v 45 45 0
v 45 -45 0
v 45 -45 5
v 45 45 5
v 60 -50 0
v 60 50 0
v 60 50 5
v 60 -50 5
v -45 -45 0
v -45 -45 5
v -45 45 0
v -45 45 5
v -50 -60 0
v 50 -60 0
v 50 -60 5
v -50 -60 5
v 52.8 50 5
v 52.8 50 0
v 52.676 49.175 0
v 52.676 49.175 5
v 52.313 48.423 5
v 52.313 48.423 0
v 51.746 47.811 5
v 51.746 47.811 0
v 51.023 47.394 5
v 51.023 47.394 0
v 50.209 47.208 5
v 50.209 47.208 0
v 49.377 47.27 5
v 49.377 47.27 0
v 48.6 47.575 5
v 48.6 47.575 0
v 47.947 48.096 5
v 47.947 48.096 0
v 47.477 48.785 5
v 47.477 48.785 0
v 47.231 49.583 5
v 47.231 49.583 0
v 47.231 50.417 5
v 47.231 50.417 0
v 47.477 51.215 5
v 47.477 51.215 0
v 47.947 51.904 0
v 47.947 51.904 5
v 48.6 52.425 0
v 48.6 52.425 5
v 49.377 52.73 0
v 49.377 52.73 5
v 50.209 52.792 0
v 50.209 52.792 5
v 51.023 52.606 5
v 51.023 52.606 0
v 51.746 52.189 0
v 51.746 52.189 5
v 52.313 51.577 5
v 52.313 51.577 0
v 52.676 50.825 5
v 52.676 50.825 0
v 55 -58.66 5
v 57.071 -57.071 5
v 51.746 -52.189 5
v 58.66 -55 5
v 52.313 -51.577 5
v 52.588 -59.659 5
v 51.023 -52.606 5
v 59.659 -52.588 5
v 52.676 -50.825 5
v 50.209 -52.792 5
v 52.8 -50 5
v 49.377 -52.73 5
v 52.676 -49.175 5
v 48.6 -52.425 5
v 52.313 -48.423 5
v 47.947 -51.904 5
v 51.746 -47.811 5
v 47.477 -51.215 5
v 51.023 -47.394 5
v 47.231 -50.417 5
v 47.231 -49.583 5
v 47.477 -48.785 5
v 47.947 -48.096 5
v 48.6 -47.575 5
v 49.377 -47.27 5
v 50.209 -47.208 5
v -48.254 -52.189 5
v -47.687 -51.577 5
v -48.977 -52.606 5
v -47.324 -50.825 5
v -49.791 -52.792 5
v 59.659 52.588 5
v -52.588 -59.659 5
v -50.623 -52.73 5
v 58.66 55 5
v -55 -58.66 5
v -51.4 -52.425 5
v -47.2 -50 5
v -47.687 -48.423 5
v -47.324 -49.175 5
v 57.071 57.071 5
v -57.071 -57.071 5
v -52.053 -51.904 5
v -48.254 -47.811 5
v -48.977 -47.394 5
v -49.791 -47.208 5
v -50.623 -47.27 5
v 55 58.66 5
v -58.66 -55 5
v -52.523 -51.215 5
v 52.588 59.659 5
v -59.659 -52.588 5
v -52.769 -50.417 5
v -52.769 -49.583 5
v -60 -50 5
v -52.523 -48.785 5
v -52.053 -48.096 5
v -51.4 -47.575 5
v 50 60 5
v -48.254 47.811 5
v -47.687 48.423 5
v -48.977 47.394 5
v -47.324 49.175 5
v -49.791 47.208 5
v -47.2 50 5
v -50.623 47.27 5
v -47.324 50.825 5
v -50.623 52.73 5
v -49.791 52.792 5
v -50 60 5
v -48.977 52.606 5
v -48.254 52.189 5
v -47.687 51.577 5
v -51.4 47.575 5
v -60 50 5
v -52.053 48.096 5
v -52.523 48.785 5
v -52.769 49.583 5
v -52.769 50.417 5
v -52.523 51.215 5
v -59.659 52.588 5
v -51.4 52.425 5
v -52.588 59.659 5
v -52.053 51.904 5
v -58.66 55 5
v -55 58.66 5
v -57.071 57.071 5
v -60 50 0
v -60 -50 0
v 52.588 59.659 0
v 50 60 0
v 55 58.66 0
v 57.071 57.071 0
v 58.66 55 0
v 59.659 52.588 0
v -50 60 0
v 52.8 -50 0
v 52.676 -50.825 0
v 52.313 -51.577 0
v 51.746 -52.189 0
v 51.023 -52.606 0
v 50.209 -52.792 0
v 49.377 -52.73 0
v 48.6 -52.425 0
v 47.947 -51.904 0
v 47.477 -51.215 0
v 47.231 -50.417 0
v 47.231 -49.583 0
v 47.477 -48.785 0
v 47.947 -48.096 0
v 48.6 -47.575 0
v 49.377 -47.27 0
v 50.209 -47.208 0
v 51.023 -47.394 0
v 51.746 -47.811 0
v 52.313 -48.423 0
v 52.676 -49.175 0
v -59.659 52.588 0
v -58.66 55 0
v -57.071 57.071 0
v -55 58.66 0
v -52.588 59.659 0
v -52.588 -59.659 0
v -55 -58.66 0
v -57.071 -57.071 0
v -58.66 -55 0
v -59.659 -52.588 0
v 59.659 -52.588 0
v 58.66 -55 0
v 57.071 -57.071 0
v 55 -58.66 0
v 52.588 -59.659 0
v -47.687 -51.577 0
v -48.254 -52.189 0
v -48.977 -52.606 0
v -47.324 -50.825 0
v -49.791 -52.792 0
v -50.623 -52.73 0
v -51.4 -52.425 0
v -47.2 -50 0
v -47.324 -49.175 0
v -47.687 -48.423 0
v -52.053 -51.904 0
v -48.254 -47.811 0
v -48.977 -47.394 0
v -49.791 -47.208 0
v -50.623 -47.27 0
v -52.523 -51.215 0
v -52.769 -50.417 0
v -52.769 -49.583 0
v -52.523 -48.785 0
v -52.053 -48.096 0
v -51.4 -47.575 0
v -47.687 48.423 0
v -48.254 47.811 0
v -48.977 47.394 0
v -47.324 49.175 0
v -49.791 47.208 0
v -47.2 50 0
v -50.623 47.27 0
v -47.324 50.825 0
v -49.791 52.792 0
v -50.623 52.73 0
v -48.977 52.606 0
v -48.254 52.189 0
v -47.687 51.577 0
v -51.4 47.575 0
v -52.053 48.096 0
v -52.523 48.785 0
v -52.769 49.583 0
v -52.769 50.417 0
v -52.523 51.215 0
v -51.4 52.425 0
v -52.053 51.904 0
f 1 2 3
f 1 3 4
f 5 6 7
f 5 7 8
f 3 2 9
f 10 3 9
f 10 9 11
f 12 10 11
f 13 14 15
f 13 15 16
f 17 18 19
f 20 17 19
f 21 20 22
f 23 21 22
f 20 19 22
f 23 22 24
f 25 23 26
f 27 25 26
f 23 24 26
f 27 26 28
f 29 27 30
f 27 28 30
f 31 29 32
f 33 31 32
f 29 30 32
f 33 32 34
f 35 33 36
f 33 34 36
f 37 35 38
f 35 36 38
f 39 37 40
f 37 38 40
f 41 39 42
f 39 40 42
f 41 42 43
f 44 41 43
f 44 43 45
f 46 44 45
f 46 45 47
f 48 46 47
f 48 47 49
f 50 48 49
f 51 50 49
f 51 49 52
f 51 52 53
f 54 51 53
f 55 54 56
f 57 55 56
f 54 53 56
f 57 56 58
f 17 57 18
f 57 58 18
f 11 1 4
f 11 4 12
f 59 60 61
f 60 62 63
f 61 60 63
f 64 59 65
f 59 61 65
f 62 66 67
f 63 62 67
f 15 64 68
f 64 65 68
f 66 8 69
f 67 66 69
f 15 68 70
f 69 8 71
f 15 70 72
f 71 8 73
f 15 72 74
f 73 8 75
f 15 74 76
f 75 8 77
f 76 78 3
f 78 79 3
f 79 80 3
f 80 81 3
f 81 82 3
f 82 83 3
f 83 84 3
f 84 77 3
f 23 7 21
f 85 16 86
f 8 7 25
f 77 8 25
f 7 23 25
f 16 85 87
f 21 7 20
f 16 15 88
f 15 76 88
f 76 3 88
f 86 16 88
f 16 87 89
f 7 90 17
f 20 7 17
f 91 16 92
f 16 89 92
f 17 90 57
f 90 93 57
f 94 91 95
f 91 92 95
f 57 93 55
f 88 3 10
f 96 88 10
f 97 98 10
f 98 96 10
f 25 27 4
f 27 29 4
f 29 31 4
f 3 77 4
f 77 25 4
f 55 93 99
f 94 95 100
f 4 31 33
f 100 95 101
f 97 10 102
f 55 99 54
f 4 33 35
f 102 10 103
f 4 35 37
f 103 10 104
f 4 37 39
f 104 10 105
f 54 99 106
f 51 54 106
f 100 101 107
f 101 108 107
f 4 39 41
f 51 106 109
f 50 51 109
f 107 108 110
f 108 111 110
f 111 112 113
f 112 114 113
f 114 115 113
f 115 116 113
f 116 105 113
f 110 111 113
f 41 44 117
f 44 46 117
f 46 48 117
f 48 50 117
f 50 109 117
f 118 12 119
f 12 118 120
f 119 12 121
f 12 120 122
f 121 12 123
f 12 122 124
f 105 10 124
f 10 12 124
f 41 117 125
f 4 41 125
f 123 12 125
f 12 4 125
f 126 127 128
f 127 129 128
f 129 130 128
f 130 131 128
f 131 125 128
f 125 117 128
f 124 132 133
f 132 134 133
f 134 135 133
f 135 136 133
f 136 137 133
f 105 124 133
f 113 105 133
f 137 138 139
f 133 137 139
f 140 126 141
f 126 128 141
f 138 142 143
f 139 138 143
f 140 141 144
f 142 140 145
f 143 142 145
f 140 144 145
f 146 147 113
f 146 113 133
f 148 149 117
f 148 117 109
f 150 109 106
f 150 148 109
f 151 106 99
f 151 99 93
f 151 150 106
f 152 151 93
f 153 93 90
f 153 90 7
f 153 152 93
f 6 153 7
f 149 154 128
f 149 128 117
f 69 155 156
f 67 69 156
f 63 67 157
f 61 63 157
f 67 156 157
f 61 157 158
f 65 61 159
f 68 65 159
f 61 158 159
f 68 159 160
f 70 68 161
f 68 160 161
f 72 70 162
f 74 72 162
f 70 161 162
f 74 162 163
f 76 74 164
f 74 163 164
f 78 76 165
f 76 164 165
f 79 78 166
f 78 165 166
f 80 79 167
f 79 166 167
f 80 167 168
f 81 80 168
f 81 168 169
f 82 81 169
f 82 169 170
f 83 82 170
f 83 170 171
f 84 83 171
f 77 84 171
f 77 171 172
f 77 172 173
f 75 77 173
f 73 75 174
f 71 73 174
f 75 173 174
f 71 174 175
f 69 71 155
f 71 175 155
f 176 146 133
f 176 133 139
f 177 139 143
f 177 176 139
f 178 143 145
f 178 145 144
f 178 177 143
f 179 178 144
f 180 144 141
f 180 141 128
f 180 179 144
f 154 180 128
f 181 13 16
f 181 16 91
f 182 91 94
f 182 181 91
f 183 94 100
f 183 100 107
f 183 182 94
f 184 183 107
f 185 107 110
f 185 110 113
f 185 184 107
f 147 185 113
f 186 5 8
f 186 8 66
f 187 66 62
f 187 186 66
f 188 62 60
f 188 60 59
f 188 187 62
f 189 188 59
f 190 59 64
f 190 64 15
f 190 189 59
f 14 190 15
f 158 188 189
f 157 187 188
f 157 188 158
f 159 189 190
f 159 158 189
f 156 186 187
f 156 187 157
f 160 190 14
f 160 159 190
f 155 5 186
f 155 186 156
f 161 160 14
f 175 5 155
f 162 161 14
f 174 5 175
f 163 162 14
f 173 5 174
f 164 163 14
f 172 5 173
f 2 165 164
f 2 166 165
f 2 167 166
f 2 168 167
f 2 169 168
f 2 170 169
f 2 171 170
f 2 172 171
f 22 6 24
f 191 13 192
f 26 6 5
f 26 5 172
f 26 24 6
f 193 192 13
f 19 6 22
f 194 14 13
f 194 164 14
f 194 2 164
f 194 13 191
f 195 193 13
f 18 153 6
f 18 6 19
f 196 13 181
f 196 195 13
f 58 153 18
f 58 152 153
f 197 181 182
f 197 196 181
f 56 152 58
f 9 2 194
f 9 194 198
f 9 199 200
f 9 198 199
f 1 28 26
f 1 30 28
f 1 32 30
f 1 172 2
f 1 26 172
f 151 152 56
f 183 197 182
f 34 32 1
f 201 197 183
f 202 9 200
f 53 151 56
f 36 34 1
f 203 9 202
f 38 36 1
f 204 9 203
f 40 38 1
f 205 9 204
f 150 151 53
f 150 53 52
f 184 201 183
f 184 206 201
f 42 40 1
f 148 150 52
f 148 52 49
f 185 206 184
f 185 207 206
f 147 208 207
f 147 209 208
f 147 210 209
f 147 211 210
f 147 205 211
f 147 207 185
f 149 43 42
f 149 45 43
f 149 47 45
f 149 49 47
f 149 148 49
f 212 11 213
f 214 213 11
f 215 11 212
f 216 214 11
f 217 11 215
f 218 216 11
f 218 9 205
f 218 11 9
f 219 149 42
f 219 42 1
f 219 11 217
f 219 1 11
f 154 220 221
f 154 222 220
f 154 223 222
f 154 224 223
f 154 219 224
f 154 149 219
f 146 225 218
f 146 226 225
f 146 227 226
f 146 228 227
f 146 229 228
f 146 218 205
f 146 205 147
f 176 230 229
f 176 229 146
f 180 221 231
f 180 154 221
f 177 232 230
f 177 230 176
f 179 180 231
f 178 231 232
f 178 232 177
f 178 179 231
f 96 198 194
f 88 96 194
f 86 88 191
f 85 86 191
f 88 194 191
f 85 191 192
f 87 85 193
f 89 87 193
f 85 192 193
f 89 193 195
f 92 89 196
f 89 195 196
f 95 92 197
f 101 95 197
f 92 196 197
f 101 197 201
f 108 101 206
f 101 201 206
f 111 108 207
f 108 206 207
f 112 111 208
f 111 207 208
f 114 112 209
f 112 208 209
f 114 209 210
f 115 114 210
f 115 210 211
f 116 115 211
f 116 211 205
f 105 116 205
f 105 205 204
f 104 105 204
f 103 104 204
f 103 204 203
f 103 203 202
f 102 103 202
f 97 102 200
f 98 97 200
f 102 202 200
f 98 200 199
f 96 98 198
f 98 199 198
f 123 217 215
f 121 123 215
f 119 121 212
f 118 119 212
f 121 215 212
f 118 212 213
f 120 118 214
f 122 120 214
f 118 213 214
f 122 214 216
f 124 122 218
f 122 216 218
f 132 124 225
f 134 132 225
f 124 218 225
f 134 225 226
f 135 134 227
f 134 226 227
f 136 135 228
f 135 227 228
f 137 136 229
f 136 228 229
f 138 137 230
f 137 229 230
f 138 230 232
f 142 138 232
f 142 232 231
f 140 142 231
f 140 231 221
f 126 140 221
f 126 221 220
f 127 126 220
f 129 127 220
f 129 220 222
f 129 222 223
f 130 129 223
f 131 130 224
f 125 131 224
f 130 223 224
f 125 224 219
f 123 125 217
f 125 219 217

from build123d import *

# Parameters (mm, degrees)
SKETCH1_R           = 2.8
SKETCH1_W           = 90
SKETCH1_H           = 90
BOSS_EXTRUDE1_DEPTH = 5


with BuildPart() as part:
    # Sketch1 → Boss-Extrude1 (new body)
    with BuildSketch(Plane(origin=(0, 0, 0), x_dir=(-1, 0, 0), z_dir=(0, 0, -1))):
        with BuildLine():
            Line((60, -50), (60, 50))
            ThreePointArc((60, 50), (57.071067812, 57.071067812), (50, 60))
            Line((50, 60), (-50, 60))
            ThreePointArc((-50, 60), (-57.071067812, 57.071067812), (-60, 50))
            Line((-60, 50), (-60, -50))
            ThreePointArc((-60, -50), (-57.071067812, -57.071067812), (-50, -60))
            Line((-50, -60), (50, -60))
            ThreePointArc((50, -60), (57.071067812, -57.071067812), (60, -50))
        make_face()
        with Locations(Location((50, -50, 0), (0, 0, 180))):
            Circle(SKETCH1_R, mode=Mode.SUBTRACT)
        with Locations(Location((-50, -50, 0), (0, 0, 180))):
            Circle(SKETCH1_R, mode=Mode.SUBTRACT)
        with Locations(Location((-50, 50, 0), (0, 0, 180))):
            Circle(SKETCH1_R, mode=Mode.SUBTRACT)
        with Locations(Location((50, 50, 0), (0, 0, 180))):
            Circle(SKETCH1_R, mode=Mode.SUBTRACT)
        Rectangle(SKETCH1_W, SKETCH1_H, mode=Mode.SUBTRACT)
    extrude(amount=-BOSS_EXTRUDE1_DEPTH)


solid = part.part
